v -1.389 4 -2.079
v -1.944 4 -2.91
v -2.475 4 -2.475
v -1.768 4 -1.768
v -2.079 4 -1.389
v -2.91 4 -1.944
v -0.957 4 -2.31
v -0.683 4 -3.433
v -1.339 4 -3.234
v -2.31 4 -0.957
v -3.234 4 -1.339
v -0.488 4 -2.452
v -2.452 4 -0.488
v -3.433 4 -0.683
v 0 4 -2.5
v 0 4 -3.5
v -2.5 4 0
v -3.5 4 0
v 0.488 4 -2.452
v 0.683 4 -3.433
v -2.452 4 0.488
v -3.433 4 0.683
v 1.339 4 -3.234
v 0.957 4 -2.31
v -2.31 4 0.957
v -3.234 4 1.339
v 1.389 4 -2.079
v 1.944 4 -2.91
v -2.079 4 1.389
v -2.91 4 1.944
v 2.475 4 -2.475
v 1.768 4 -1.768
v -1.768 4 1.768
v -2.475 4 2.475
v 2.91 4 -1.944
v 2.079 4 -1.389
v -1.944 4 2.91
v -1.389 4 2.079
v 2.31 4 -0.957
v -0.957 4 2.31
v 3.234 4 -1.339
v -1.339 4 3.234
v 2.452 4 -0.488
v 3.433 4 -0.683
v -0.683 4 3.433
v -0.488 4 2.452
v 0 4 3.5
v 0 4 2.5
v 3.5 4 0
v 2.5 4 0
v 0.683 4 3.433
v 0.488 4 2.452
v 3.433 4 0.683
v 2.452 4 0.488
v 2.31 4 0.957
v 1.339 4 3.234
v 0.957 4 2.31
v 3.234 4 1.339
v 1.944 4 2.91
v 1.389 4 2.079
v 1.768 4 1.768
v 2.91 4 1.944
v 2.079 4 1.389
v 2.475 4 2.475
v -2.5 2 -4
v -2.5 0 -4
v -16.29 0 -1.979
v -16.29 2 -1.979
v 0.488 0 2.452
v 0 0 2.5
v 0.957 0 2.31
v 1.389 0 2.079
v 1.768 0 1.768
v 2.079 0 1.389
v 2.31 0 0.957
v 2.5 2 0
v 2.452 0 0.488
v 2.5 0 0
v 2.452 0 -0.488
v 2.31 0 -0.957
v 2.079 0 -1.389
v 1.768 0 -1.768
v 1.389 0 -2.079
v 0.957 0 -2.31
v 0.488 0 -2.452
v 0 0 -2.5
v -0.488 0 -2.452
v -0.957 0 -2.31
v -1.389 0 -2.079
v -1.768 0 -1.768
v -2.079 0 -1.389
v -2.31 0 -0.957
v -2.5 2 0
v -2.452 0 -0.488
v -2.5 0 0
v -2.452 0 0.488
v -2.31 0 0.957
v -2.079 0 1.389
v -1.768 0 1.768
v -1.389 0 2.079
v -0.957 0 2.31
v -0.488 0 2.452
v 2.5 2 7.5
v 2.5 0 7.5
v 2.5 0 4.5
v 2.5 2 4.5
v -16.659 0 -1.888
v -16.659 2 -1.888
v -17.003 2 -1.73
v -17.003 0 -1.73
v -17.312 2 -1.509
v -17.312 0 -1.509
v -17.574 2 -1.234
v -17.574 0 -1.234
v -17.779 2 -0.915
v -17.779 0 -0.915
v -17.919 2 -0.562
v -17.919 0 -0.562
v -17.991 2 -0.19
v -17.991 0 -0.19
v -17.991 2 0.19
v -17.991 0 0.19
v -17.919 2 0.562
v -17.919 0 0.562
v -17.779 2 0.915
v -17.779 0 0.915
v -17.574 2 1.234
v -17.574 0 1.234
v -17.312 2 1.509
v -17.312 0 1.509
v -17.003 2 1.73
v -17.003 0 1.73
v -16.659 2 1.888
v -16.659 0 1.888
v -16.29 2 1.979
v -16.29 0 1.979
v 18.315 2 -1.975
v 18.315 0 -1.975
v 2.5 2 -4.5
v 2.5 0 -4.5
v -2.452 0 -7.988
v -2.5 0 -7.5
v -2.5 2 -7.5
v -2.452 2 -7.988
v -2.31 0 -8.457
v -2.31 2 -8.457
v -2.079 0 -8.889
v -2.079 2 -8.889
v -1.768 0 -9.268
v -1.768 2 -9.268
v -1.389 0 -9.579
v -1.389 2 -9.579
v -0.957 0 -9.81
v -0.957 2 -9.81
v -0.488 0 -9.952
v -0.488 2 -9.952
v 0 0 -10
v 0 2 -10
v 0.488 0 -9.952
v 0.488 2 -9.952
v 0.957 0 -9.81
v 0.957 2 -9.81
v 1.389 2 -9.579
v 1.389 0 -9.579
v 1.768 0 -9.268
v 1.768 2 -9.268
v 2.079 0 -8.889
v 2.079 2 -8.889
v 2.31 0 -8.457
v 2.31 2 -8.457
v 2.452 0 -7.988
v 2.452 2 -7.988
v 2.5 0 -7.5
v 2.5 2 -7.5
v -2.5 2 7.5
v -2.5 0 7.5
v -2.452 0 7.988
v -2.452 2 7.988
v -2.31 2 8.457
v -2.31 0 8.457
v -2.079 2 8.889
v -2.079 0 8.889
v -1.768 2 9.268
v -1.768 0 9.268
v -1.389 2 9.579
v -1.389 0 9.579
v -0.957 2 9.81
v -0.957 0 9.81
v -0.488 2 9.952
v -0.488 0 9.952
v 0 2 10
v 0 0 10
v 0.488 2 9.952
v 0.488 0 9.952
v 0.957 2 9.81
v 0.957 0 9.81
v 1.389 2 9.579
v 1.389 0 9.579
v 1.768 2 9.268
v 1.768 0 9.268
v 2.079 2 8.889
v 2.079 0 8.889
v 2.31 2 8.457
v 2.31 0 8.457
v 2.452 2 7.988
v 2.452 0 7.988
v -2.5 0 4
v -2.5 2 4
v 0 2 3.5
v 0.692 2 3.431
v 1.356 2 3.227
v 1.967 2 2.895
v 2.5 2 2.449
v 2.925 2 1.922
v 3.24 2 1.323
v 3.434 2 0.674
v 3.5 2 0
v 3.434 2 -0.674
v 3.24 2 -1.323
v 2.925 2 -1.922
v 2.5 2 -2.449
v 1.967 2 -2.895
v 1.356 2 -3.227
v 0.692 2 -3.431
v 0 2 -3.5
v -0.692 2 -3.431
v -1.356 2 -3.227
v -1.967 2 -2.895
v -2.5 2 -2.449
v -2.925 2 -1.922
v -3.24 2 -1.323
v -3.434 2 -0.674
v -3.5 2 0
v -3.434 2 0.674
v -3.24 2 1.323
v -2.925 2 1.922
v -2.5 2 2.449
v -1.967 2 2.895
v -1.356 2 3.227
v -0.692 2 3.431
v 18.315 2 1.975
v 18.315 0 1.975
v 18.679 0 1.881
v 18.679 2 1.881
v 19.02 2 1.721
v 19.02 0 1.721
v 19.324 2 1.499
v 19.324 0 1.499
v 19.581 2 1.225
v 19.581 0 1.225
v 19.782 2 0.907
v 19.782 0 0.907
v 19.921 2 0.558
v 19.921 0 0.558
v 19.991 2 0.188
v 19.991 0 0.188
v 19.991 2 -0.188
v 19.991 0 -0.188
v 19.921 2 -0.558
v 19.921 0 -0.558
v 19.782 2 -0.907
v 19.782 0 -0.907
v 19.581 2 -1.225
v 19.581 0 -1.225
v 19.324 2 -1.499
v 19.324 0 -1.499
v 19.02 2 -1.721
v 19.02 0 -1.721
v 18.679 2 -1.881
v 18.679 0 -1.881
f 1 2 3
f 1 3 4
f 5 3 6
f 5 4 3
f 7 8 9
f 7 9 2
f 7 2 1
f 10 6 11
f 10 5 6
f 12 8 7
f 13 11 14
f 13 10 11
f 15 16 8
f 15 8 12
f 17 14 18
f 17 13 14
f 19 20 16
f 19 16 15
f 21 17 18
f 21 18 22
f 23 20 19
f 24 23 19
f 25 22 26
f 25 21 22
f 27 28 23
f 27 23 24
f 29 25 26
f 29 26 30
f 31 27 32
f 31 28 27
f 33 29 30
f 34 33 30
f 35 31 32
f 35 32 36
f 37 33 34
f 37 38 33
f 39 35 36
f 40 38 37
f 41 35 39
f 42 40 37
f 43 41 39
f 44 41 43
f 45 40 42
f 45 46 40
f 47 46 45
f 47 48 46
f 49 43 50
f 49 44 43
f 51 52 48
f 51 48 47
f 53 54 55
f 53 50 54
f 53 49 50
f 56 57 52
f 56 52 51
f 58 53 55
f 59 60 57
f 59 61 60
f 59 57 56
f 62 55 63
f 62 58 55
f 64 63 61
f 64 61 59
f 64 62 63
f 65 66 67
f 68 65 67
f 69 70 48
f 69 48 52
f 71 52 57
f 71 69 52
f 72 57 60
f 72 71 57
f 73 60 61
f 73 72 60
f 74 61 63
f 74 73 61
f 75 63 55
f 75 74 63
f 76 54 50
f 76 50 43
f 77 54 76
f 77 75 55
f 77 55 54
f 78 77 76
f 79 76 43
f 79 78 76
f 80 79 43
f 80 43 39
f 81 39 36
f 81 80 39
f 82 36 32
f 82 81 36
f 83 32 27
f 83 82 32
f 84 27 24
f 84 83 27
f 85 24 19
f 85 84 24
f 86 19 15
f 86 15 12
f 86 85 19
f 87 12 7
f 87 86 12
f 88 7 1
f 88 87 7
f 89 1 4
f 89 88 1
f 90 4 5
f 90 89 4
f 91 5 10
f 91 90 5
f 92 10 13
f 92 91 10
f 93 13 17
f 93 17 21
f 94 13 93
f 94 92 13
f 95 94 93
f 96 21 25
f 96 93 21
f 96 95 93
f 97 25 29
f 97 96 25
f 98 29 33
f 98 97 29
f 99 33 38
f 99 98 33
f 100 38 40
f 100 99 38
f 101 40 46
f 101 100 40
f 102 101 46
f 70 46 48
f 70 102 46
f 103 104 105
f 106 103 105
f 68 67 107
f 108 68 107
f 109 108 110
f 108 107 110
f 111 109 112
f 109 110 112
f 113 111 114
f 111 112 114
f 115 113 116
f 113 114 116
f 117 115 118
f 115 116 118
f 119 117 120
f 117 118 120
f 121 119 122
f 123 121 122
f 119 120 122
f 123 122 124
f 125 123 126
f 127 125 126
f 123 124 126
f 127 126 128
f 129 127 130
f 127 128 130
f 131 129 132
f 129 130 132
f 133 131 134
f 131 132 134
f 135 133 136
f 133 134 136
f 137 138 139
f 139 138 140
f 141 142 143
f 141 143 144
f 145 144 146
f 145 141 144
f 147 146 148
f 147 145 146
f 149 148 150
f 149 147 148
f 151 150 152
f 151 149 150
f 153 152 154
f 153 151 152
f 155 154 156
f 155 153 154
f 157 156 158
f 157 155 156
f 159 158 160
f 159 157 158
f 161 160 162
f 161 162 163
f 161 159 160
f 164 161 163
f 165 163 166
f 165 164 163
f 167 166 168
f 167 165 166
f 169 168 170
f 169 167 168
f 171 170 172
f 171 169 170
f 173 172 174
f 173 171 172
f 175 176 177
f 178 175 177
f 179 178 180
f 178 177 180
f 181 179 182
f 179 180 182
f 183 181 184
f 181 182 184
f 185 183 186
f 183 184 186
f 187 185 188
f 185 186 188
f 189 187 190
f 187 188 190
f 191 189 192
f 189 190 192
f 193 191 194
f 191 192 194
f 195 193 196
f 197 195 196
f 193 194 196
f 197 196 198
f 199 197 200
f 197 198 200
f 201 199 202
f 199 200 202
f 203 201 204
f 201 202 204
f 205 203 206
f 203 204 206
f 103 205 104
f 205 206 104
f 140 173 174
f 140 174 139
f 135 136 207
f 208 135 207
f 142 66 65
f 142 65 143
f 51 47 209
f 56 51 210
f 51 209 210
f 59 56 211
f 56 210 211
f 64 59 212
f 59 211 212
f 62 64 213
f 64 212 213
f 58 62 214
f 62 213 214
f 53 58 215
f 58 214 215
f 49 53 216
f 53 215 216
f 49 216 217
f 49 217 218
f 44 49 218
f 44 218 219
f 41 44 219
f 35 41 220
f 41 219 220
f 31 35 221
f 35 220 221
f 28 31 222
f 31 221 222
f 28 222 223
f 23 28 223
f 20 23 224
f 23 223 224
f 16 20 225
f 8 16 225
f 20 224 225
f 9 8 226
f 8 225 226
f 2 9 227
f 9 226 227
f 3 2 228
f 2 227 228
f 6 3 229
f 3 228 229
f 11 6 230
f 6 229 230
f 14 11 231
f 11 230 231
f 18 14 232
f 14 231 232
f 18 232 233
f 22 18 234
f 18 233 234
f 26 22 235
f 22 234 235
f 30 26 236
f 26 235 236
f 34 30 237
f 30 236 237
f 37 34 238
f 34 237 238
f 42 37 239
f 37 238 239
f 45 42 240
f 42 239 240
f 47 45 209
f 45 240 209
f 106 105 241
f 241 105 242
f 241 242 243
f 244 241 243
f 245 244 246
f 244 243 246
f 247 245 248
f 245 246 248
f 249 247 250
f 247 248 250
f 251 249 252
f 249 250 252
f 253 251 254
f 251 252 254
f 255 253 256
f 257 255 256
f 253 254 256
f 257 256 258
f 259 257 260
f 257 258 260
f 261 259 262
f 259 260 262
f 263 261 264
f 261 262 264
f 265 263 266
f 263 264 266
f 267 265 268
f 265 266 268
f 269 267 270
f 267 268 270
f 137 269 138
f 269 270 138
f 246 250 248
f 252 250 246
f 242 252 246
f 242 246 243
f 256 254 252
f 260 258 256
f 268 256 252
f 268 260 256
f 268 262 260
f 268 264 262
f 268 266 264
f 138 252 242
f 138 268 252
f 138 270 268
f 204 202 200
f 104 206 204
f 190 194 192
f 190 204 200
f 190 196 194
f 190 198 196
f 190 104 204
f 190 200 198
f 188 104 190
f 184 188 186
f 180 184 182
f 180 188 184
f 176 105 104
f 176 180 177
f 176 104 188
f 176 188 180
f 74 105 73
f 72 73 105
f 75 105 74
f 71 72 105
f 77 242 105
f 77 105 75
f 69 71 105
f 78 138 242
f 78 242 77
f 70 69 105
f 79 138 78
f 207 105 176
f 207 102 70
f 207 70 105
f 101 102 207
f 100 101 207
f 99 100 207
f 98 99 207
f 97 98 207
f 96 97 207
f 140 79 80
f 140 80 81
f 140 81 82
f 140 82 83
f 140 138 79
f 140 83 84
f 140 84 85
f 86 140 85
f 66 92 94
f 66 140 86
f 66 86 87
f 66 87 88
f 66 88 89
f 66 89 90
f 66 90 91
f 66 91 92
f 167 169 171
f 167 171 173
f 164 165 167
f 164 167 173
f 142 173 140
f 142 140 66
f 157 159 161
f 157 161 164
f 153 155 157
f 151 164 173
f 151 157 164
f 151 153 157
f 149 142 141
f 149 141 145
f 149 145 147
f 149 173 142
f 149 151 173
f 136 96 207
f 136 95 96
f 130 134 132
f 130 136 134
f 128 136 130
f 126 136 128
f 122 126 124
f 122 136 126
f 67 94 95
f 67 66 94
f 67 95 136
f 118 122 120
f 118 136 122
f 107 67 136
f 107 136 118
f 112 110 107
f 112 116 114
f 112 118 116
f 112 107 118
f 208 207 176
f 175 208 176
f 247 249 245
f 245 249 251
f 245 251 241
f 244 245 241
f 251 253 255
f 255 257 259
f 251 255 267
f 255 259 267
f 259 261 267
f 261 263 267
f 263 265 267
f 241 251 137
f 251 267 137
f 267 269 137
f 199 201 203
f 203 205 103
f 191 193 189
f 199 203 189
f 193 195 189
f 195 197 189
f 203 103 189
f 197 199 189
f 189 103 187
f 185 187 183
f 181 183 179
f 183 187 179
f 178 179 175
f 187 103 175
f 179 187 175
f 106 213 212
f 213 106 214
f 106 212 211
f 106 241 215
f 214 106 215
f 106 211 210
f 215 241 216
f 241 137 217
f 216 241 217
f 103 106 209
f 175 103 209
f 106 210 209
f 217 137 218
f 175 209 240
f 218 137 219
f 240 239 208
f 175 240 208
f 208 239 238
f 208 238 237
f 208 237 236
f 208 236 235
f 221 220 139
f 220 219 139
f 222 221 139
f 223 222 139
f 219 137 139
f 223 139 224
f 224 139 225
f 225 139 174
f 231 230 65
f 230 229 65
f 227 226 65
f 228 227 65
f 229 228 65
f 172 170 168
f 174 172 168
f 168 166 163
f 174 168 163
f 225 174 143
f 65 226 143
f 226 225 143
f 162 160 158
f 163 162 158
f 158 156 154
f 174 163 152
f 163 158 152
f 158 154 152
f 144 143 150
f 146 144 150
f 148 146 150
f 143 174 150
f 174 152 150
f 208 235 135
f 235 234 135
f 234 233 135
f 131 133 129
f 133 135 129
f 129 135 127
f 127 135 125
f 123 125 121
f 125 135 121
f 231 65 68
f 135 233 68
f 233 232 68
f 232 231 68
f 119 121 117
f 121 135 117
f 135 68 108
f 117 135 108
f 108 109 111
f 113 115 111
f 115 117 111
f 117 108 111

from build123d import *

# Parameters (mm, degrees)
SKETCH1_R           = 3.5
SKETCH1_R_2         = 2.5
BOSS_EXTRUDE1_DEPTH = 4
BOSS_EXTRUDE2_DEPTH = 2


with BuildPart() as part:
    # Sketch1 → Boss-Extrude1 (new body)
    with BuildSketch(Plane(origin=(0, 0, 0), x_dir=(1, 0, 0), z_dir=(0, 1, 0))):
        with Locations(Location((0, 0, 0), (0, 0, 270))):
            Circle(SKETCH1_R)
        with Locations(Location((0, 0, 0), (0, 0, 270))):
            Circle(SKETCH1_R_2, mode=Mode.SUBTRACT)
    extrude(amount=BOSS_EXTRUDE1_DEPTH)

    # Sketch2 → Boss-Extrude2 (add)
    with BuildSketch(Plane(origin=(0, 0, 0), x_dir=(1, 0, 0), z_dir=(0, 1, 0))):
        with BuildLine():
            Line((-2.5, 2.449489743), (-2.5, 7.5))
            ThreePointArc((-2.5, 7.5), (0, 10), (2.5, 7.5))
            Line((2.5, 7.5), (2.5, 2.449489743))
            ThreePointArc((2.5, 2.449489743), (0, 3.5), (-2.5, 2.449489743))
        make_face()
        with BuildLine():
            Line((2.5, 4.5), (2.5, 0))
            Line((2.5, 0), (2.5, -4.5))
            Line((2.5, -4.5), (18.315318835, -1.974987097))
            ThreePointArc((18.315318835, -1.974987097), (20, 0), (18.315318835, 1.974987097))
            Line((18.315318835, 1.974987097), (2.5, 4.5))
        make_face()
        with BuildLine():
            Line((-2.5, -2.449489743), (-2.5, -7.5))
            ThreePointArc((-2.5, -7.5), (0, -10), (2.5, -7.5))
            Line((2.5, -7.5), (2.5, -2.449489743))
            ThreePointArc((2.5, -2.449489743), (0, -3.5), (-2.5, -2.449489743))
        make_face()
        with BuildLine():
            Line((-2.5, -4), (-2.5, 0))
            Line((-2.5, 0), (-2.5, 4))
            Line((-2.5, 4), (-16.290032176, 1.978858594))
            ThreePointArc((-16.290032176, 1.978858594), (-18, 0), (-16.290032176, -1.978858594))
            Line((-16.290032176, -1.978858594), (-2.5, -4))
        make_face()
    extrude(amount=BOSS_EXTRUDE2_DEPTH)


solid = part.part
